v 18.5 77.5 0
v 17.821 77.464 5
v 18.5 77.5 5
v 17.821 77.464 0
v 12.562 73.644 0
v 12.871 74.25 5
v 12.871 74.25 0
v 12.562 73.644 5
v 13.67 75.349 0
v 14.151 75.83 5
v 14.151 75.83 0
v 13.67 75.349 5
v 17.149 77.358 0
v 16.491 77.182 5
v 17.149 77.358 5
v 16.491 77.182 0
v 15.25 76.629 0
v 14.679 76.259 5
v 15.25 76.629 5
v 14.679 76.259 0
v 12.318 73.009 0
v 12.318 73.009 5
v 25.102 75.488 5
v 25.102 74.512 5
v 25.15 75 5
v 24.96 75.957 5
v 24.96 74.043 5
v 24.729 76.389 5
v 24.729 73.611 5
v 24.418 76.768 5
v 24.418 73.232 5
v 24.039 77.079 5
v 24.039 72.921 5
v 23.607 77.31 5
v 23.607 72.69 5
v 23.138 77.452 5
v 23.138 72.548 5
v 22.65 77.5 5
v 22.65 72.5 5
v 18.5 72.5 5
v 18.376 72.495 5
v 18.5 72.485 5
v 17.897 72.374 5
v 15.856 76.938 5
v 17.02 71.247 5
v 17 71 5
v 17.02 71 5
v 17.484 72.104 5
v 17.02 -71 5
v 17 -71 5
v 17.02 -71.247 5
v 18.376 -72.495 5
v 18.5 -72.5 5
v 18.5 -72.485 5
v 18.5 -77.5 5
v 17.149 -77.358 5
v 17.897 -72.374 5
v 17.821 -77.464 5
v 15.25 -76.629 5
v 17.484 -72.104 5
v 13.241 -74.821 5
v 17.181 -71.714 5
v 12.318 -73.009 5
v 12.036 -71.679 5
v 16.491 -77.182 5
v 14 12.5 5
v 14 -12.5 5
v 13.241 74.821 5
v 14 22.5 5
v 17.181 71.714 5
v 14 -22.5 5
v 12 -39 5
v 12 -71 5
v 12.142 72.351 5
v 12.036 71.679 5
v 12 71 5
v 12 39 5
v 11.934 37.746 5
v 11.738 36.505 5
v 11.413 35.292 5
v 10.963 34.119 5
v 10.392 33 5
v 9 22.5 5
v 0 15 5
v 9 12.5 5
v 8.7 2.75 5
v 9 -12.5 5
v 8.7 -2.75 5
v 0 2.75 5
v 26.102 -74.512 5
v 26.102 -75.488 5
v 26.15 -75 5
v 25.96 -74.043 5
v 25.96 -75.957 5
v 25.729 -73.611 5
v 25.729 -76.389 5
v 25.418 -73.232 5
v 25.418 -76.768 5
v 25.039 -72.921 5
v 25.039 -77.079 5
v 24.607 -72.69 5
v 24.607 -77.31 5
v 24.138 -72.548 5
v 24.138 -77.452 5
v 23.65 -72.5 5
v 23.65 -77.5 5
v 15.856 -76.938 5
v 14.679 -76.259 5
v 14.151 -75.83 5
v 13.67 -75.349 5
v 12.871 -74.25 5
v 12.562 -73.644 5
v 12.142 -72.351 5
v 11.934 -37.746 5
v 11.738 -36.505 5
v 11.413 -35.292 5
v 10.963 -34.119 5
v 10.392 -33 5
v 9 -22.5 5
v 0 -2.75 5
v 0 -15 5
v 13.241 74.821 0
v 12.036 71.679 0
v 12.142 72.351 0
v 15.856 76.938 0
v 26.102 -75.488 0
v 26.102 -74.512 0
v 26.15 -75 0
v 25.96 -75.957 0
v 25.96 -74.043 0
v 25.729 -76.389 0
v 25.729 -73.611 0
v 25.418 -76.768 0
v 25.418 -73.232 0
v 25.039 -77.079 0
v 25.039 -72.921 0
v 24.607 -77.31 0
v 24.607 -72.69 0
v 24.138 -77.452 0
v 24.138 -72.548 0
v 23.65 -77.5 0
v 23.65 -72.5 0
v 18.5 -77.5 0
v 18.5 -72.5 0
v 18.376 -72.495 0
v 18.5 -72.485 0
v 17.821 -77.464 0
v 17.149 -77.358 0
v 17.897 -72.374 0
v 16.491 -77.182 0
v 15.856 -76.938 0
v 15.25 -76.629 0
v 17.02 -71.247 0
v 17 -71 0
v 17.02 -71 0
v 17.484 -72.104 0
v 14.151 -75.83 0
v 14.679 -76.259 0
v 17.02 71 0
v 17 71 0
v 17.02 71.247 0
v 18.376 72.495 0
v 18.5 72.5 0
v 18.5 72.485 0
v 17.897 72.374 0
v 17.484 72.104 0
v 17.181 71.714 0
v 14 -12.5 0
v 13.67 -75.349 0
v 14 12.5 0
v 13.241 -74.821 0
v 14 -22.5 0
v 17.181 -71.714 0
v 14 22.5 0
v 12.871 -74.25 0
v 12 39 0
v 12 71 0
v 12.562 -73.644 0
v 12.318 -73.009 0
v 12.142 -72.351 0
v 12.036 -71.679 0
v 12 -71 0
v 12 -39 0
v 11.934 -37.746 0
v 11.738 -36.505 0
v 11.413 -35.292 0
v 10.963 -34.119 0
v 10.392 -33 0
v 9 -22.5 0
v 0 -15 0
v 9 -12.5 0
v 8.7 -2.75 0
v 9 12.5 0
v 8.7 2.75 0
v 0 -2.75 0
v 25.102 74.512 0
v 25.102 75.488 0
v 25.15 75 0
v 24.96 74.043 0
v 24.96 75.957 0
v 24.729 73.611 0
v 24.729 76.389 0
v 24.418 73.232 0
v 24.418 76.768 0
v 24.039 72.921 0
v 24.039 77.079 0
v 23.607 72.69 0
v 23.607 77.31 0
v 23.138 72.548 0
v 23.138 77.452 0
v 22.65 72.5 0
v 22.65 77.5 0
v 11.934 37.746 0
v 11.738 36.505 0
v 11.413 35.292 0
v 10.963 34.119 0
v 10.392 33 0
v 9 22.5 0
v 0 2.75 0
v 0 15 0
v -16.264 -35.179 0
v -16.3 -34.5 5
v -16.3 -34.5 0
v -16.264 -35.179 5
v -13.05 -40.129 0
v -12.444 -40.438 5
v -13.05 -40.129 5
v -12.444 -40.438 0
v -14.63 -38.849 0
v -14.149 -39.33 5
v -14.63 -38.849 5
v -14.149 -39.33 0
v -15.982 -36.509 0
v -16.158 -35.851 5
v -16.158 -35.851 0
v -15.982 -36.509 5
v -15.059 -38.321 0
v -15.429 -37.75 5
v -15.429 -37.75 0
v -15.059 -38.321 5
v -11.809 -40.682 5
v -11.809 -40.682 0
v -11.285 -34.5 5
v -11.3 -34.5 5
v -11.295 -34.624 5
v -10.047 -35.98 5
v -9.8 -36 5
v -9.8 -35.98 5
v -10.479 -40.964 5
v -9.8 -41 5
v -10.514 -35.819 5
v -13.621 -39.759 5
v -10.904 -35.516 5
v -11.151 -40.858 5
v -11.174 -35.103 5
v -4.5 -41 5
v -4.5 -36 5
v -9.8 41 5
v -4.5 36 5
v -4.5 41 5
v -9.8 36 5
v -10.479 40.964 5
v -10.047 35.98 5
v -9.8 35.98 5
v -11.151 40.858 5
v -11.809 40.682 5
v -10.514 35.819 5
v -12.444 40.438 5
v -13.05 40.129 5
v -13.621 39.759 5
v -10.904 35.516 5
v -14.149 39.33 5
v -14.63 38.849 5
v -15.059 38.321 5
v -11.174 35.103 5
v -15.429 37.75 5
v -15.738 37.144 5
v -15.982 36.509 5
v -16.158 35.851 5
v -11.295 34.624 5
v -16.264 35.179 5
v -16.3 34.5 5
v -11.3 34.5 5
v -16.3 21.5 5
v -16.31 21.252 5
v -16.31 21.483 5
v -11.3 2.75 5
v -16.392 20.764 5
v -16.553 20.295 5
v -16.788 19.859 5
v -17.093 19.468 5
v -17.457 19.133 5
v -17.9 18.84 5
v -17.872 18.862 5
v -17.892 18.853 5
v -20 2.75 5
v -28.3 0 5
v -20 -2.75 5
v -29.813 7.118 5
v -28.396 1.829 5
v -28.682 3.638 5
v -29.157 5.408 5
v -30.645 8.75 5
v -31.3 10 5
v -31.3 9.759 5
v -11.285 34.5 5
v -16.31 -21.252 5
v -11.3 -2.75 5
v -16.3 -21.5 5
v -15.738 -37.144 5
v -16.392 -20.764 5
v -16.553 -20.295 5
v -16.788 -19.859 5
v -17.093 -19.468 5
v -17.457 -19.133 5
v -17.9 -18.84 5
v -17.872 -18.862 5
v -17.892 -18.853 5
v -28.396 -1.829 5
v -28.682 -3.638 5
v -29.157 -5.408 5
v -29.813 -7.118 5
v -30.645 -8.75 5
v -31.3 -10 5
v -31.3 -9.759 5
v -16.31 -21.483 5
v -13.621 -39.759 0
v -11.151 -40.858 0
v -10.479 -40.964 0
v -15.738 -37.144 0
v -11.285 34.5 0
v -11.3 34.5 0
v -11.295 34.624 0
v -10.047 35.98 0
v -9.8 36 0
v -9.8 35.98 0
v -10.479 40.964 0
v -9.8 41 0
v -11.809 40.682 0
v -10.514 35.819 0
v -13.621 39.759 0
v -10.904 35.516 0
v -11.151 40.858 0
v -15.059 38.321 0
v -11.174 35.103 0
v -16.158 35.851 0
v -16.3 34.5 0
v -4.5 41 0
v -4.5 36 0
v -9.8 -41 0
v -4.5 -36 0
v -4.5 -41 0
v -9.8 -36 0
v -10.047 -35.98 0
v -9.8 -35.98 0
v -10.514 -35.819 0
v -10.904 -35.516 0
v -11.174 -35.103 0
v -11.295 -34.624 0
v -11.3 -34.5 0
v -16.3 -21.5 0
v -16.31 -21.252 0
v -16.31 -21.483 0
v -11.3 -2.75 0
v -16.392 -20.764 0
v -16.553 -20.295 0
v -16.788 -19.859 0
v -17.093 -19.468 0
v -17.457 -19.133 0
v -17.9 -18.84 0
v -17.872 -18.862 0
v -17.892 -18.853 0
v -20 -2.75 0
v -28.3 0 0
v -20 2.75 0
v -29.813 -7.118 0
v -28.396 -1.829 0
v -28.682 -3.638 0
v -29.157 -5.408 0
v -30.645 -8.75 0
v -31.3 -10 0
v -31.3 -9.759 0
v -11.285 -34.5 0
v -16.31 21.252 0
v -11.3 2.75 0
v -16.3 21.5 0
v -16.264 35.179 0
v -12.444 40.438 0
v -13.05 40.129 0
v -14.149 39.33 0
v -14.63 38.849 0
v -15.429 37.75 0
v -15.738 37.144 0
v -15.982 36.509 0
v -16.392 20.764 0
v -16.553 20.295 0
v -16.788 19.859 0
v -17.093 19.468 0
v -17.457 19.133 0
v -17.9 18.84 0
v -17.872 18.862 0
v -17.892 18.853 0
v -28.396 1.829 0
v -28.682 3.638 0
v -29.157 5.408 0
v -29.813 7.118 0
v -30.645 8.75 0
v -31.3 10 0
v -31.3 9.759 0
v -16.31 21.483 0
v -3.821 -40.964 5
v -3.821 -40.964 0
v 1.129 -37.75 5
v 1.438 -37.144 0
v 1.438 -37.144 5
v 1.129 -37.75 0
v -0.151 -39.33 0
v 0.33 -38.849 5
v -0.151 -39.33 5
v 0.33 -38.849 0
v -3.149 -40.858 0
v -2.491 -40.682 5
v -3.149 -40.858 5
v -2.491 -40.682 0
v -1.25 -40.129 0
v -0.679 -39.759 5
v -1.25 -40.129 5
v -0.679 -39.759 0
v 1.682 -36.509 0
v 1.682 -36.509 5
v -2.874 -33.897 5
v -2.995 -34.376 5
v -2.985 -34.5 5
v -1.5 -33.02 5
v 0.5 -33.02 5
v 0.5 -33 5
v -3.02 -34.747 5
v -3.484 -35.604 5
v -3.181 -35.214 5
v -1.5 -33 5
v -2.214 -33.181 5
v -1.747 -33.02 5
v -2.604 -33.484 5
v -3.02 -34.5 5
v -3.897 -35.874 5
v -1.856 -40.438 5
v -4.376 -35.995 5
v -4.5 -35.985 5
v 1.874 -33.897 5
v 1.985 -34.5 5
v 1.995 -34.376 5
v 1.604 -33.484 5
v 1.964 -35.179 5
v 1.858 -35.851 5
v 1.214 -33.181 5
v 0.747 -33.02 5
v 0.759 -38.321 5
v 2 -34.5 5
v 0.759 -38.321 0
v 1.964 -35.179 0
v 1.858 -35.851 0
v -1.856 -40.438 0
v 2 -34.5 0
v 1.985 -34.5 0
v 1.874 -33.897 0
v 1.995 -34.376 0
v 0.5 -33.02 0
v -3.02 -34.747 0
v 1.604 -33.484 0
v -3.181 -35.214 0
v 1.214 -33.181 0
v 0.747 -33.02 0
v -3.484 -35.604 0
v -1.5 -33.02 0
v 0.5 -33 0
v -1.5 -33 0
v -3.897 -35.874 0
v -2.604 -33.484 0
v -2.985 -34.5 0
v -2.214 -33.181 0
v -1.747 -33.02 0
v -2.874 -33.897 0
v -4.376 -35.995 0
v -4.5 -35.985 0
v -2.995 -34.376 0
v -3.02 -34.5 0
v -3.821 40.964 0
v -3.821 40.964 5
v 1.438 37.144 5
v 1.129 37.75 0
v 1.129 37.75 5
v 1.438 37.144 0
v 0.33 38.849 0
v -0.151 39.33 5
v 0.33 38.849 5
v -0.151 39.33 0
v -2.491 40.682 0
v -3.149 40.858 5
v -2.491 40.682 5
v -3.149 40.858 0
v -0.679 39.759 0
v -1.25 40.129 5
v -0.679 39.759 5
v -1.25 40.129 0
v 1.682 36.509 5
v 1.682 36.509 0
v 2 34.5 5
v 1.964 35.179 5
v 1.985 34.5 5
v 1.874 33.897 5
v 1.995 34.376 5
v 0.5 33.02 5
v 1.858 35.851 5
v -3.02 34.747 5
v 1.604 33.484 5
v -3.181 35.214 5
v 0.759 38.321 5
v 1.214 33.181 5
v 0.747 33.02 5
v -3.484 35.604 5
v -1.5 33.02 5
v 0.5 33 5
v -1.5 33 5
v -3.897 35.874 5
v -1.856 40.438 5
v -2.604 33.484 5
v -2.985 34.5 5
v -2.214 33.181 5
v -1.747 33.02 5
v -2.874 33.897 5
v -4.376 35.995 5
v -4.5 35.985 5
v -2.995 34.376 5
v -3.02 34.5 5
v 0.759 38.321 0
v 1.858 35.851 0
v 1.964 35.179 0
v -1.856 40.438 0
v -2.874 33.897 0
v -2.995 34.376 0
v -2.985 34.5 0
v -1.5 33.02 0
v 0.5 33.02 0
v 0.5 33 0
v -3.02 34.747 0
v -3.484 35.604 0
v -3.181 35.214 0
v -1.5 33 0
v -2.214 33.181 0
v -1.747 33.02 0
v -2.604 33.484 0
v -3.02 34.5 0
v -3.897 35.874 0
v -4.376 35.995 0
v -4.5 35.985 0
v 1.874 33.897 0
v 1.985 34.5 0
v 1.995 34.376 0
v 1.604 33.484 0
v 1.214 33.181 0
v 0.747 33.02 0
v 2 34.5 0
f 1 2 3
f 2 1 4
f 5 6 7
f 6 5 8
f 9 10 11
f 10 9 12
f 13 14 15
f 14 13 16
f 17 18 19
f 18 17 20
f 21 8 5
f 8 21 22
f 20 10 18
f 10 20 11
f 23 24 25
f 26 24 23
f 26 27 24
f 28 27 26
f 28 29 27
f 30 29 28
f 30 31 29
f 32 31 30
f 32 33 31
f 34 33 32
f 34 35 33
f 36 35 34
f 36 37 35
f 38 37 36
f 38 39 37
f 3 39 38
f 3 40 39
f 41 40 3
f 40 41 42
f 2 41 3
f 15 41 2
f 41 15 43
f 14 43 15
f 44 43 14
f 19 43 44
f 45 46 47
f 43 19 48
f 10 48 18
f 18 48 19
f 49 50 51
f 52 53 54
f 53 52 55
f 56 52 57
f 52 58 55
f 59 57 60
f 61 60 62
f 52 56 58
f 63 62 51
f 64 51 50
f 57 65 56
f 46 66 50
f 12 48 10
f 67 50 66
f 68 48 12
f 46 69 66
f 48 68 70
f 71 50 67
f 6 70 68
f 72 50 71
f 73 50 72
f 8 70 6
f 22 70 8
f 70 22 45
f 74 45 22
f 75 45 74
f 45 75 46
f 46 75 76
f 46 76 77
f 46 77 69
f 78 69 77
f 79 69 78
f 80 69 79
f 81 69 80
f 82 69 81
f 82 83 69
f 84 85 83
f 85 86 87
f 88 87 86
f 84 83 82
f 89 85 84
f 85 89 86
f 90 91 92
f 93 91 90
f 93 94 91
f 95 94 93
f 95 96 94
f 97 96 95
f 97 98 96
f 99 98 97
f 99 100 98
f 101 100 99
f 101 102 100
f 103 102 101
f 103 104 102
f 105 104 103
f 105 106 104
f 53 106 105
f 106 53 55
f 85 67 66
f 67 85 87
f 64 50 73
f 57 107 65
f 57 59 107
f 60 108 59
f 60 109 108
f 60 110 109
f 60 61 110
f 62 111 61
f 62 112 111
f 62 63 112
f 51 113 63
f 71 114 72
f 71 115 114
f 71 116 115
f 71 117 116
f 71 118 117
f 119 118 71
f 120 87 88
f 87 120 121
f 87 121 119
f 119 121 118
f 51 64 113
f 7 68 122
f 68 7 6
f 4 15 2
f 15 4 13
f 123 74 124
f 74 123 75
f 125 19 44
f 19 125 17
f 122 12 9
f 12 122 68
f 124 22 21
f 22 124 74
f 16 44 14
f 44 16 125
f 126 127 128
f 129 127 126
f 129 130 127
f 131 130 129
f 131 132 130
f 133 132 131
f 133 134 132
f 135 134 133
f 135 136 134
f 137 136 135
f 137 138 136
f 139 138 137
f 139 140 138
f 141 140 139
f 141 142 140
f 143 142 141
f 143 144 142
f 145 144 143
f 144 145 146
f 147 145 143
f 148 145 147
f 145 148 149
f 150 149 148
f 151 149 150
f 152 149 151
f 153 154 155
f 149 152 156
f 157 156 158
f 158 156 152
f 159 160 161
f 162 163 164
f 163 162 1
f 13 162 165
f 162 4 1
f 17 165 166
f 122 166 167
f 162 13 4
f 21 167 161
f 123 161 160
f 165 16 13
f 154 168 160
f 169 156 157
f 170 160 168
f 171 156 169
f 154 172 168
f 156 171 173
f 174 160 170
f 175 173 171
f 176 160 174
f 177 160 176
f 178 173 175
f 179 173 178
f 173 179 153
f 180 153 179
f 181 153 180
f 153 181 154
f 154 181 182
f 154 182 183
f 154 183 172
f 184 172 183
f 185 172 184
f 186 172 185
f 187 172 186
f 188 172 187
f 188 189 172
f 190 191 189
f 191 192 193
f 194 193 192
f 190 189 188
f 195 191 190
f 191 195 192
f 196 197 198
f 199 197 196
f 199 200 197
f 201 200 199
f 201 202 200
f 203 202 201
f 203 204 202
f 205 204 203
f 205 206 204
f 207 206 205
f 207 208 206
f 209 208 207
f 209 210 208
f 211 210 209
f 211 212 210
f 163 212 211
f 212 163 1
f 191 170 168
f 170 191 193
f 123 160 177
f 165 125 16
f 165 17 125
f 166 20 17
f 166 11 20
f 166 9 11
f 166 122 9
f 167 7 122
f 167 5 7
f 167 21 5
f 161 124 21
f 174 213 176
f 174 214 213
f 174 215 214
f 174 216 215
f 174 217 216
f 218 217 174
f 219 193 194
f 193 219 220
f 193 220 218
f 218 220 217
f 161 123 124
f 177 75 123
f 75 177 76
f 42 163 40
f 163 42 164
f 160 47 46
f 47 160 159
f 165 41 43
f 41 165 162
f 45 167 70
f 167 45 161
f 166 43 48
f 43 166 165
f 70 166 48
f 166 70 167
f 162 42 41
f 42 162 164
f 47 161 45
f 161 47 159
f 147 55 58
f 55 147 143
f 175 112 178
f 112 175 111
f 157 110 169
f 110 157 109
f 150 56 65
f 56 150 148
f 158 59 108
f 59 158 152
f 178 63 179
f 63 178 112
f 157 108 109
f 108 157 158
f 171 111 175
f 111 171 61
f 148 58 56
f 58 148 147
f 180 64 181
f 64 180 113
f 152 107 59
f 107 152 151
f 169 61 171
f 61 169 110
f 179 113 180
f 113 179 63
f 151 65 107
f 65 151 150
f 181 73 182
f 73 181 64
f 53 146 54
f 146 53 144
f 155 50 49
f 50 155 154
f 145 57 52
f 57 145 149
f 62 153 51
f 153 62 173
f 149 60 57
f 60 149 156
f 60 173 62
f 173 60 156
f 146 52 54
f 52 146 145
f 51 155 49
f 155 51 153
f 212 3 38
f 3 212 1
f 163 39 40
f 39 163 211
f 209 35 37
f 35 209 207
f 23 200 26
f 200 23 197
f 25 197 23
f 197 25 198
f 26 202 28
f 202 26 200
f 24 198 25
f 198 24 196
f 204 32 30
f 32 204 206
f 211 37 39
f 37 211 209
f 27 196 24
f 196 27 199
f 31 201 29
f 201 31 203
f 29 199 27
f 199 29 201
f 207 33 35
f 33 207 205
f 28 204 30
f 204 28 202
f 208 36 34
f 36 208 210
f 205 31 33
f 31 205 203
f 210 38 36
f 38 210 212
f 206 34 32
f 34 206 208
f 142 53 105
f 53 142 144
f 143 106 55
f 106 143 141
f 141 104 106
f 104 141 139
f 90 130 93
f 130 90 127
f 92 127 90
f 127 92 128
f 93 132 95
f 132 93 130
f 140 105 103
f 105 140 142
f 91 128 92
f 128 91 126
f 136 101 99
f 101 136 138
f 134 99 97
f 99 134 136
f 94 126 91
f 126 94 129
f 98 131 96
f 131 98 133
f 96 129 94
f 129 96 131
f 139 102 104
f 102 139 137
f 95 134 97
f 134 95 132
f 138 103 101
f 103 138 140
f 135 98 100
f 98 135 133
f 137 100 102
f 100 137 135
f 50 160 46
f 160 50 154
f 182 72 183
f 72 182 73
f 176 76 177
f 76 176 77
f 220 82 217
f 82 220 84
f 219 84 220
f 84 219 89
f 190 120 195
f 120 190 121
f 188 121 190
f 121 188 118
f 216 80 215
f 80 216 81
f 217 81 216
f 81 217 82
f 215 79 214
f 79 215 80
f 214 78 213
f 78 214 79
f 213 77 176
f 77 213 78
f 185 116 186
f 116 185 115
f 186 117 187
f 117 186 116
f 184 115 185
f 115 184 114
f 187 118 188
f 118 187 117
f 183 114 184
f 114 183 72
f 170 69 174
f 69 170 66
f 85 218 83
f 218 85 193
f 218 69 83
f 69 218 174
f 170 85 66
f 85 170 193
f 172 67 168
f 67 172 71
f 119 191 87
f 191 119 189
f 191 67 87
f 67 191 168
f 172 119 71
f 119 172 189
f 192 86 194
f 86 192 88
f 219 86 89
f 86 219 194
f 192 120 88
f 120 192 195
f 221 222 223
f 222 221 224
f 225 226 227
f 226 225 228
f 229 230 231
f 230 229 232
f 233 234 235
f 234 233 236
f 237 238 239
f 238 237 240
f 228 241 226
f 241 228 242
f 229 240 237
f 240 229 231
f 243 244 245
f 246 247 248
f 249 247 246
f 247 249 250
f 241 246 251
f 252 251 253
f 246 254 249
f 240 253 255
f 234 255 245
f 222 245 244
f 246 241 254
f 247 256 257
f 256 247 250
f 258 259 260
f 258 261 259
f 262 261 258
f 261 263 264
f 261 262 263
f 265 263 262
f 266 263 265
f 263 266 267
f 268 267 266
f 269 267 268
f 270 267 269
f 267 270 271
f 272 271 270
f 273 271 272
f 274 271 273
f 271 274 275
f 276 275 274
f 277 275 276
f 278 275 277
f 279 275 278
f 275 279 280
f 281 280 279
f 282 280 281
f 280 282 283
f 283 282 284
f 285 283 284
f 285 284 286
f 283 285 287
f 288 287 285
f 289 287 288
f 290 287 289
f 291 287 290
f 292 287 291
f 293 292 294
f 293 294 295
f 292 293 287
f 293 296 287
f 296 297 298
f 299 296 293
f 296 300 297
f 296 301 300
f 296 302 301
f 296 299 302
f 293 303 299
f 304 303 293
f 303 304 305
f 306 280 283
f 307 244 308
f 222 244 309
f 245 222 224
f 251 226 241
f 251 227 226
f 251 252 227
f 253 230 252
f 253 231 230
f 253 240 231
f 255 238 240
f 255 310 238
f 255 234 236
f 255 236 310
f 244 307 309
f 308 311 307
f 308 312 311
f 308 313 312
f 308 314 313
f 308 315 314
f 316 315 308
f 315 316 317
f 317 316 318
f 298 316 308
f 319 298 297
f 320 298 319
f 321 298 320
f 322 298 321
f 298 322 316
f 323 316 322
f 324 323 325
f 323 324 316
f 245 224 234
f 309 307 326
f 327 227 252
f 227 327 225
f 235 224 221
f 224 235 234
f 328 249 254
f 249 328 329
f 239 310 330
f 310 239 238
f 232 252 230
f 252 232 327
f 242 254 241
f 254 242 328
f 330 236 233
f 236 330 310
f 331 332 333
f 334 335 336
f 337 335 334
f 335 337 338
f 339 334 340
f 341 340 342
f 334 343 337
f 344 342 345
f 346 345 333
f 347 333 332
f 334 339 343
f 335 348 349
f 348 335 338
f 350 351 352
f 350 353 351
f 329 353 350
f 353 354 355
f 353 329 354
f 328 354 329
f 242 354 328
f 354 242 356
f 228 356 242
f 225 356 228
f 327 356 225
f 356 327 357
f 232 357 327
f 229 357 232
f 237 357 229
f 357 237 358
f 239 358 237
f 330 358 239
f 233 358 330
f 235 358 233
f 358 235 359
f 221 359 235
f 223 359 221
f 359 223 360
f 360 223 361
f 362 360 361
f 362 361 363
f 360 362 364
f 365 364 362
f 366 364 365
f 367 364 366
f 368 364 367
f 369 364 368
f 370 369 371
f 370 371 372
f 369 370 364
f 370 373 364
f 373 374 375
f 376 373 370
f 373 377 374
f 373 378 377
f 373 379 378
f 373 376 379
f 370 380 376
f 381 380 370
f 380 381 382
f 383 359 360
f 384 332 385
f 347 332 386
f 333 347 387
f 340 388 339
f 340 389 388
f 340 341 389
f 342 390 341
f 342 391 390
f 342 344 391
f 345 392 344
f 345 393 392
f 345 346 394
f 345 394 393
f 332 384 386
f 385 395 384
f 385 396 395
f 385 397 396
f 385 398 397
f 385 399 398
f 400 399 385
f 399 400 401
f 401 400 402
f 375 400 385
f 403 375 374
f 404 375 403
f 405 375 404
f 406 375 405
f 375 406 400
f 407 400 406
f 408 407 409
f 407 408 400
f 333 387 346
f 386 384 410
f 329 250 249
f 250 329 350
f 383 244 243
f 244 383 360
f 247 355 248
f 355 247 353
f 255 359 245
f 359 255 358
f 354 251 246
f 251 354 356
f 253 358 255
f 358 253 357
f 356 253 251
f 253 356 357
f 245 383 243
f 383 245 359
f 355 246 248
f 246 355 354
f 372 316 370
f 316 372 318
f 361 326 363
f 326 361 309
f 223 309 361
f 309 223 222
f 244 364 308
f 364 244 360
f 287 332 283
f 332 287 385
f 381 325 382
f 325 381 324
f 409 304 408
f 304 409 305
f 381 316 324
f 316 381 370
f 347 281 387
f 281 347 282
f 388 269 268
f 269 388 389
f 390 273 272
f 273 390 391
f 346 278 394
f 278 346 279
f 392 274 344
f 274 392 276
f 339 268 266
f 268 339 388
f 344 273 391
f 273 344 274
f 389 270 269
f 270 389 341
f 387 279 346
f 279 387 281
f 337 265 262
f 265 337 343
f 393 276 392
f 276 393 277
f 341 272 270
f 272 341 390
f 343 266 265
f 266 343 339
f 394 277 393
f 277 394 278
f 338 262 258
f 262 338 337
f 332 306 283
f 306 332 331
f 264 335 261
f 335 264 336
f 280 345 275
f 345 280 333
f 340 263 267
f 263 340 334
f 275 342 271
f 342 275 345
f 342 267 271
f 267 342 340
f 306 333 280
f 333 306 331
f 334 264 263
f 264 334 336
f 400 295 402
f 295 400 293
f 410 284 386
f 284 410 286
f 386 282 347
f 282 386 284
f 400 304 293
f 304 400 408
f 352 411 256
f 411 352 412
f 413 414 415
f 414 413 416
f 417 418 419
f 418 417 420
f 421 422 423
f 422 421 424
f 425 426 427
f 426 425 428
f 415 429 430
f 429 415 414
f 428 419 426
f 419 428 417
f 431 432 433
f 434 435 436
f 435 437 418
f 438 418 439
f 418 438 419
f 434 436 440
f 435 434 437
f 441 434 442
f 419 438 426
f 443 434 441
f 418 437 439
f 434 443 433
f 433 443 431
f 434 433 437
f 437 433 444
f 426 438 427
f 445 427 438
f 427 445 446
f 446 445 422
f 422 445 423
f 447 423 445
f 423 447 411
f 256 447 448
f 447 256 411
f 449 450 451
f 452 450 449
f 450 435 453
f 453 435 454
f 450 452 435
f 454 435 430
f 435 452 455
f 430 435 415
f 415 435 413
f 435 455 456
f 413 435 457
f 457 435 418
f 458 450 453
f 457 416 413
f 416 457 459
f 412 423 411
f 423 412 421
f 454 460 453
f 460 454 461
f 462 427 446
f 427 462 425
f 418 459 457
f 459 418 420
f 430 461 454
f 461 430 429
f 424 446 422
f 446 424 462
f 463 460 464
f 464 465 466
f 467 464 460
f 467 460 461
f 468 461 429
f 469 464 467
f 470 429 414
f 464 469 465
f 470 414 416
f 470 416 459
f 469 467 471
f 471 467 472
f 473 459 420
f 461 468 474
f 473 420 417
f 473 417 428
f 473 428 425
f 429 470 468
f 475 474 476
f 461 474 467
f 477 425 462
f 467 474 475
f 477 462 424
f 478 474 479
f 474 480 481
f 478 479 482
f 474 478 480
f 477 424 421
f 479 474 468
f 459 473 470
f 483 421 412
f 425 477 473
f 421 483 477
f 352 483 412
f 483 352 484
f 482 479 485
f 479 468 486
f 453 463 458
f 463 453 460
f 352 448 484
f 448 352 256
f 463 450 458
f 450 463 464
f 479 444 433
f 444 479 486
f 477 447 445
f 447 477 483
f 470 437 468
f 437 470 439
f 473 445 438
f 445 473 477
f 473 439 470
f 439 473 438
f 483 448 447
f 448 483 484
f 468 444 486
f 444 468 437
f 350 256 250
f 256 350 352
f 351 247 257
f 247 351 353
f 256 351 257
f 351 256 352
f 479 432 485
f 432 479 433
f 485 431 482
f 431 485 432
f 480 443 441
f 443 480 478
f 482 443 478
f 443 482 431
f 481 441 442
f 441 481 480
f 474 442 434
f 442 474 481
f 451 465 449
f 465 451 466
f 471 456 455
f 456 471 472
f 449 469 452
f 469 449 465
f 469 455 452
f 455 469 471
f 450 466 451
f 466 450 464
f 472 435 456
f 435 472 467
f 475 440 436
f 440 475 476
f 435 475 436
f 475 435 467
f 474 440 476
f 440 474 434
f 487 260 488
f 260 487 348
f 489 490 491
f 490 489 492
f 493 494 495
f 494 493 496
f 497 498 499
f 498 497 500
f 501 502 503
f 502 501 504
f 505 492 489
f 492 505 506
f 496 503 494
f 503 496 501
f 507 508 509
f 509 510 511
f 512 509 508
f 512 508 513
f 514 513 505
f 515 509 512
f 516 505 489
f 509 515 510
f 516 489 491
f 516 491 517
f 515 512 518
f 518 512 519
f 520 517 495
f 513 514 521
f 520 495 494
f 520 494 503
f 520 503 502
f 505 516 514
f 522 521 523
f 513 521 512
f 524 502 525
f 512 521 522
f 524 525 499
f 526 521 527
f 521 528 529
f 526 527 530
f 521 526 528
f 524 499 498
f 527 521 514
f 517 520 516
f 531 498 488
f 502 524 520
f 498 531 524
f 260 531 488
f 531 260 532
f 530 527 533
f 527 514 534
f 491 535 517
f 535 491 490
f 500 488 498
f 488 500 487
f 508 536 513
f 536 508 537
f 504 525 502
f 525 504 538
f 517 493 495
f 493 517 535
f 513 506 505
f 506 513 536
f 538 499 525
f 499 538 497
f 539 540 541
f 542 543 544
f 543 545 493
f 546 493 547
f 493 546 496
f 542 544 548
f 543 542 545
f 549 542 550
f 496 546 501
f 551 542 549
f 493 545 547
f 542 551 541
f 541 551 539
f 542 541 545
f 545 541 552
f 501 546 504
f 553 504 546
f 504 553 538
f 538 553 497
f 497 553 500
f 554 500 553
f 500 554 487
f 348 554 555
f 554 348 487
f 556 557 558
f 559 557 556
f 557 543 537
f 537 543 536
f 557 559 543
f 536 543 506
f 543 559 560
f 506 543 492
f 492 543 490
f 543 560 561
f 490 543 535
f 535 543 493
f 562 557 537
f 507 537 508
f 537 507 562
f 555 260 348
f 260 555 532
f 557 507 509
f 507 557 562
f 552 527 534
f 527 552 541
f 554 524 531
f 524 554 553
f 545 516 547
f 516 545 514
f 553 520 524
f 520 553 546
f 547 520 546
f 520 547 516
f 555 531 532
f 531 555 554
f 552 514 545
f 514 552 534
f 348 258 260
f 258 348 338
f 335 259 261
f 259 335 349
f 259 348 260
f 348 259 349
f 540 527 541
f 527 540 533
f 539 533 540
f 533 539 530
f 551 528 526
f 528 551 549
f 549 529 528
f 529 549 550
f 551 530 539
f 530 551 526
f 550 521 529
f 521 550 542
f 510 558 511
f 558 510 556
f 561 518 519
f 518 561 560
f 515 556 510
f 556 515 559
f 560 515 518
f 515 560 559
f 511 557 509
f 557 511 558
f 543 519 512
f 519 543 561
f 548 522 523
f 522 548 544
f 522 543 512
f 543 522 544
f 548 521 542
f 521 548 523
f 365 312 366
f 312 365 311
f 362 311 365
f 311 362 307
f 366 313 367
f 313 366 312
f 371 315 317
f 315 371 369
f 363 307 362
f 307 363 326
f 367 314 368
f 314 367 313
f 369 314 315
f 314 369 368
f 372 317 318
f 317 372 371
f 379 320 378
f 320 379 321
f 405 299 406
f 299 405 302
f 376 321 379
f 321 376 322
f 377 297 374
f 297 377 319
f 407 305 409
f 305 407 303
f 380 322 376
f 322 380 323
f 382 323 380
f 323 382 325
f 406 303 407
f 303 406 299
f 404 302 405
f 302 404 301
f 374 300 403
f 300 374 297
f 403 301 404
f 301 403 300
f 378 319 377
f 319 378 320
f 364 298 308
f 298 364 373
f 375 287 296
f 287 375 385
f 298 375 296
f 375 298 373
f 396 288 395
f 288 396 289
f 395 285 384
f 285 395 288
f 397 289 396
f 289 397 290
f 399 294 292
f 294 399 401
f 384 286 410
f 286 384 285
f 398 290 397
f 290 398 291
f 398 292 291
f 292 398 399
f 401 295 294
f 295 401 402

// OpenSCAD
// Depending on your printer, you should add an extra 1 to 2 mm.
Phone_Length=145;
// Depending on your printer, you should add an extra 1 to 2 mm.
Phone_Width=72;
// Depending on your printer, you should add an extra 1 to 2 mm.
Phone_Thickness = 8.3;
// Offset the phone vertically. This is useful if your phone have side buttons at the middle that is blocked by the side grip. A positive value will shift the phone upwards, while a negative value shifts it downwards.
Vertical_Offset = 0;
// Allow you to attach two vertical pieces instead of one. This can be useful if you want to charge your phone while it's in the holder. This option is affected by the Swap_Catches option.
Dual_Vertical = 0; // [1:True, 0:False]
// Trade off between improved grip and ease of insertion/removal. Increasing this number will increase height of the top catch, improving grip but making it harder to remove the phone. The default should be fine for most cases.
Grip = 0;
// Swap the vertical and horizontal catches. Use this if you need to mount the holder on a horizontal bar. This option will affect which part is considered the vertical piece for the Dual_Vertical option.
Swap_Catches = 0; // [1:True, 0:False]

// Diameter of the bar where the holder is to be mounted.
Handle_Bar_Diameter = 35;
// Distance from the handle bar to the back of the phone. A smaller number will give a lower profile.
Holder_Height = 17; // [11:20]



/* [Hidden] */
$fs = 0.5;
$fa = 6;

module copy_mirror(vec=[0,1,0]) {
 union() {
  children();
  mirror(vec) children();
 }
};

module rounded_corner(vec=[0,0,0],rot=0) {
 translate(vec) rotate([0,0,rot]) difference(){
  intersection(){
   cylinder(r=6.5,h=5);
   translate([-6.5,0,0]) cube([6.5,6.5,5]);
  };
  cylinder(r=1.5,h=5);
 };
};

// Vertical Piece
//translate([2.5,0,0]) rotate([0,-90,0]) difference(){
difference(){
 union() {
  translate ([0,Vertical_Offset,0]) union(){
   copy_mirror([0,1,0]) rounded_corner([18.5,Phone_Length/2-1.5,0]);
   translate([12,-Phone_Length/2+1.5,0]) cube([5,Phone_Length-3,5]);
   if (Swap_Catches == 0) {
    translate([18.5,Phone_Length/2,0]) cube([Phone_Thickness/2+Grip,5,5]);
    translate([18.5+Phone_Thickness/2+Grip,Phone_Length/2+2.5,0]) cylinder(r=2.5,h=5);
    translate([18.5,-Phone_Length/2-5,0]) cube([Phone_Thickness/2+1,5,5]);
    translate([19.5+Phone_Thickness/2,-Phone_Length/2-2.5,0]) cylinder(r=2.5,h=5);
   } else {
    copy_mirror([0,1,0]) {
     translate([18.5,Phone_Length/2,0]) cube([Phone_Thickness-3,5,5]);
     rounded_corner([17+Phone_Thickness-1.5,Phone_Length/2-1.5,0],-90);
     translate([17+Phone_Thickness+1.5,Phone_Length/2-1.5,0]) cylinder(r=1.5,h=5);
     translate([17+Phone_Thickness+5-1.5,Phone_Length/2-1.5,0]) cylinder(r=1.5,h=5);
     translate([17+Phone_Thickness+1.5,Phone_Length/2-3,0]) cube([1.5,2,5]);
    }
   }
  };
  linear_extrude(height=5) polygon([[12,-39],[12,39],[10.3923,33],[0,15],[0,-15],[10.3923,-33]]);
 };
 copy_mirror([0,1,0]) translate([0,39,0]) cylinder(r=12,h=5);
 if (Dual_Vertical == 1 && Swap_Catches == 1) {
    copy_mirror([0,1,0]) translate([9,14.5,0]) cube([5,10,5]);
    copy_mirror([0,1,0]) translate([17-Holder_Height,-5.5/2+8,0]) cube([Holder_Height/2+0.2,5.5,5]);
 } else {
    copy_mirror([0,1,0]) translate([9,12.5,0]) cube([5,10,5]);
    translate([17-Holder_Height,-5.5/2,0]) cube([Holder_Height/2+0.2,5.5,5]);
 }
 translate([-Holder_Height,-30,0]) cube([17,60,5]);
};

// Horizontal Piece
//translate([0,2.5,0]) rotate([90,0,0]) copy_mirror([1,0,0]) difference(){
translate([-20 - Phone_Thickness,0,0]) rotate([0,0,-90]) difference(){
 union(){
  copy_mirror([1,0,0]) {
   linear_extrude(height=5) polygon([[0,-3],[10,-3],[18.84,10.4],[21.5,12],[Phone_Width/2-1.5,12],[Phone_Width/2-1.5,17],[0,17]]);
   rounded_corner([Phone_Width/2-1.5,18.5,0],180);
  }
  if (Swap_Catches == 0) {
   copy_mirror([1,0,0]) {
    translate([Phone_Width/2,18.5,0]) cube([5,Phone_Thickness-3,5]);
    rounded_corner([Phone_Width/2-1.5,17+Phone_Thickness-1.5,0],-90);
    translate([Phone_Width/2-1.5,17+Phone_Thickness+1.5,0]) cylinder(r=1.5,h=5);
    translate([Phone_Width/2-1.5,17+Phone_Thickness+5-1.5,0]) cylinder(r=1.5,h=5);
    translate([Phone_Width/2-3,17+Phone_Thickness+1.5,0]) cube([1.5,2,5]);
   }
  } else {
    translate([Phone_Width/2,18.5,0]) cube([5,Phone_Thickness/2+Grip,5]);
    translate([Phone_Width/2+2.5,18.5+Phone_Thickness/2+Grip,0]) cylinder(r=2.5,h=5);
    translate([-Phone_Width/2-5,18.5,0]) cube([5,Phone_Thickness/2+1,5]);
    translate([-Phone_Width/2-2.5,19.5+Phone_Thickness/2,0]) cylinder(r=2.5,h=5);
  }
 }
 copy_mirror([1,0,0]) {
  translate([21.5,9,0]) cylinder(r=3,h=5);
  translate([0,-Handle_Bar_Diameter/2-Holder_Height+17,0]) cylinder(r=Handle_Bar_Diameter/2,h=10);
  if (Dual_Vertical == 1 && Swap_Catches == 0) {
    translate([-5.5/2+8,17-(Holder_Height/2+0.2),0]) cube([5.5,Holder_Height/2+0.2,5]);
  } else {
    translate([-5.5/2,17-(Holder_Height/2+0.2),0]) cube([5.5,Holder_Height/2+0.2,5]);
  }
 }
};
